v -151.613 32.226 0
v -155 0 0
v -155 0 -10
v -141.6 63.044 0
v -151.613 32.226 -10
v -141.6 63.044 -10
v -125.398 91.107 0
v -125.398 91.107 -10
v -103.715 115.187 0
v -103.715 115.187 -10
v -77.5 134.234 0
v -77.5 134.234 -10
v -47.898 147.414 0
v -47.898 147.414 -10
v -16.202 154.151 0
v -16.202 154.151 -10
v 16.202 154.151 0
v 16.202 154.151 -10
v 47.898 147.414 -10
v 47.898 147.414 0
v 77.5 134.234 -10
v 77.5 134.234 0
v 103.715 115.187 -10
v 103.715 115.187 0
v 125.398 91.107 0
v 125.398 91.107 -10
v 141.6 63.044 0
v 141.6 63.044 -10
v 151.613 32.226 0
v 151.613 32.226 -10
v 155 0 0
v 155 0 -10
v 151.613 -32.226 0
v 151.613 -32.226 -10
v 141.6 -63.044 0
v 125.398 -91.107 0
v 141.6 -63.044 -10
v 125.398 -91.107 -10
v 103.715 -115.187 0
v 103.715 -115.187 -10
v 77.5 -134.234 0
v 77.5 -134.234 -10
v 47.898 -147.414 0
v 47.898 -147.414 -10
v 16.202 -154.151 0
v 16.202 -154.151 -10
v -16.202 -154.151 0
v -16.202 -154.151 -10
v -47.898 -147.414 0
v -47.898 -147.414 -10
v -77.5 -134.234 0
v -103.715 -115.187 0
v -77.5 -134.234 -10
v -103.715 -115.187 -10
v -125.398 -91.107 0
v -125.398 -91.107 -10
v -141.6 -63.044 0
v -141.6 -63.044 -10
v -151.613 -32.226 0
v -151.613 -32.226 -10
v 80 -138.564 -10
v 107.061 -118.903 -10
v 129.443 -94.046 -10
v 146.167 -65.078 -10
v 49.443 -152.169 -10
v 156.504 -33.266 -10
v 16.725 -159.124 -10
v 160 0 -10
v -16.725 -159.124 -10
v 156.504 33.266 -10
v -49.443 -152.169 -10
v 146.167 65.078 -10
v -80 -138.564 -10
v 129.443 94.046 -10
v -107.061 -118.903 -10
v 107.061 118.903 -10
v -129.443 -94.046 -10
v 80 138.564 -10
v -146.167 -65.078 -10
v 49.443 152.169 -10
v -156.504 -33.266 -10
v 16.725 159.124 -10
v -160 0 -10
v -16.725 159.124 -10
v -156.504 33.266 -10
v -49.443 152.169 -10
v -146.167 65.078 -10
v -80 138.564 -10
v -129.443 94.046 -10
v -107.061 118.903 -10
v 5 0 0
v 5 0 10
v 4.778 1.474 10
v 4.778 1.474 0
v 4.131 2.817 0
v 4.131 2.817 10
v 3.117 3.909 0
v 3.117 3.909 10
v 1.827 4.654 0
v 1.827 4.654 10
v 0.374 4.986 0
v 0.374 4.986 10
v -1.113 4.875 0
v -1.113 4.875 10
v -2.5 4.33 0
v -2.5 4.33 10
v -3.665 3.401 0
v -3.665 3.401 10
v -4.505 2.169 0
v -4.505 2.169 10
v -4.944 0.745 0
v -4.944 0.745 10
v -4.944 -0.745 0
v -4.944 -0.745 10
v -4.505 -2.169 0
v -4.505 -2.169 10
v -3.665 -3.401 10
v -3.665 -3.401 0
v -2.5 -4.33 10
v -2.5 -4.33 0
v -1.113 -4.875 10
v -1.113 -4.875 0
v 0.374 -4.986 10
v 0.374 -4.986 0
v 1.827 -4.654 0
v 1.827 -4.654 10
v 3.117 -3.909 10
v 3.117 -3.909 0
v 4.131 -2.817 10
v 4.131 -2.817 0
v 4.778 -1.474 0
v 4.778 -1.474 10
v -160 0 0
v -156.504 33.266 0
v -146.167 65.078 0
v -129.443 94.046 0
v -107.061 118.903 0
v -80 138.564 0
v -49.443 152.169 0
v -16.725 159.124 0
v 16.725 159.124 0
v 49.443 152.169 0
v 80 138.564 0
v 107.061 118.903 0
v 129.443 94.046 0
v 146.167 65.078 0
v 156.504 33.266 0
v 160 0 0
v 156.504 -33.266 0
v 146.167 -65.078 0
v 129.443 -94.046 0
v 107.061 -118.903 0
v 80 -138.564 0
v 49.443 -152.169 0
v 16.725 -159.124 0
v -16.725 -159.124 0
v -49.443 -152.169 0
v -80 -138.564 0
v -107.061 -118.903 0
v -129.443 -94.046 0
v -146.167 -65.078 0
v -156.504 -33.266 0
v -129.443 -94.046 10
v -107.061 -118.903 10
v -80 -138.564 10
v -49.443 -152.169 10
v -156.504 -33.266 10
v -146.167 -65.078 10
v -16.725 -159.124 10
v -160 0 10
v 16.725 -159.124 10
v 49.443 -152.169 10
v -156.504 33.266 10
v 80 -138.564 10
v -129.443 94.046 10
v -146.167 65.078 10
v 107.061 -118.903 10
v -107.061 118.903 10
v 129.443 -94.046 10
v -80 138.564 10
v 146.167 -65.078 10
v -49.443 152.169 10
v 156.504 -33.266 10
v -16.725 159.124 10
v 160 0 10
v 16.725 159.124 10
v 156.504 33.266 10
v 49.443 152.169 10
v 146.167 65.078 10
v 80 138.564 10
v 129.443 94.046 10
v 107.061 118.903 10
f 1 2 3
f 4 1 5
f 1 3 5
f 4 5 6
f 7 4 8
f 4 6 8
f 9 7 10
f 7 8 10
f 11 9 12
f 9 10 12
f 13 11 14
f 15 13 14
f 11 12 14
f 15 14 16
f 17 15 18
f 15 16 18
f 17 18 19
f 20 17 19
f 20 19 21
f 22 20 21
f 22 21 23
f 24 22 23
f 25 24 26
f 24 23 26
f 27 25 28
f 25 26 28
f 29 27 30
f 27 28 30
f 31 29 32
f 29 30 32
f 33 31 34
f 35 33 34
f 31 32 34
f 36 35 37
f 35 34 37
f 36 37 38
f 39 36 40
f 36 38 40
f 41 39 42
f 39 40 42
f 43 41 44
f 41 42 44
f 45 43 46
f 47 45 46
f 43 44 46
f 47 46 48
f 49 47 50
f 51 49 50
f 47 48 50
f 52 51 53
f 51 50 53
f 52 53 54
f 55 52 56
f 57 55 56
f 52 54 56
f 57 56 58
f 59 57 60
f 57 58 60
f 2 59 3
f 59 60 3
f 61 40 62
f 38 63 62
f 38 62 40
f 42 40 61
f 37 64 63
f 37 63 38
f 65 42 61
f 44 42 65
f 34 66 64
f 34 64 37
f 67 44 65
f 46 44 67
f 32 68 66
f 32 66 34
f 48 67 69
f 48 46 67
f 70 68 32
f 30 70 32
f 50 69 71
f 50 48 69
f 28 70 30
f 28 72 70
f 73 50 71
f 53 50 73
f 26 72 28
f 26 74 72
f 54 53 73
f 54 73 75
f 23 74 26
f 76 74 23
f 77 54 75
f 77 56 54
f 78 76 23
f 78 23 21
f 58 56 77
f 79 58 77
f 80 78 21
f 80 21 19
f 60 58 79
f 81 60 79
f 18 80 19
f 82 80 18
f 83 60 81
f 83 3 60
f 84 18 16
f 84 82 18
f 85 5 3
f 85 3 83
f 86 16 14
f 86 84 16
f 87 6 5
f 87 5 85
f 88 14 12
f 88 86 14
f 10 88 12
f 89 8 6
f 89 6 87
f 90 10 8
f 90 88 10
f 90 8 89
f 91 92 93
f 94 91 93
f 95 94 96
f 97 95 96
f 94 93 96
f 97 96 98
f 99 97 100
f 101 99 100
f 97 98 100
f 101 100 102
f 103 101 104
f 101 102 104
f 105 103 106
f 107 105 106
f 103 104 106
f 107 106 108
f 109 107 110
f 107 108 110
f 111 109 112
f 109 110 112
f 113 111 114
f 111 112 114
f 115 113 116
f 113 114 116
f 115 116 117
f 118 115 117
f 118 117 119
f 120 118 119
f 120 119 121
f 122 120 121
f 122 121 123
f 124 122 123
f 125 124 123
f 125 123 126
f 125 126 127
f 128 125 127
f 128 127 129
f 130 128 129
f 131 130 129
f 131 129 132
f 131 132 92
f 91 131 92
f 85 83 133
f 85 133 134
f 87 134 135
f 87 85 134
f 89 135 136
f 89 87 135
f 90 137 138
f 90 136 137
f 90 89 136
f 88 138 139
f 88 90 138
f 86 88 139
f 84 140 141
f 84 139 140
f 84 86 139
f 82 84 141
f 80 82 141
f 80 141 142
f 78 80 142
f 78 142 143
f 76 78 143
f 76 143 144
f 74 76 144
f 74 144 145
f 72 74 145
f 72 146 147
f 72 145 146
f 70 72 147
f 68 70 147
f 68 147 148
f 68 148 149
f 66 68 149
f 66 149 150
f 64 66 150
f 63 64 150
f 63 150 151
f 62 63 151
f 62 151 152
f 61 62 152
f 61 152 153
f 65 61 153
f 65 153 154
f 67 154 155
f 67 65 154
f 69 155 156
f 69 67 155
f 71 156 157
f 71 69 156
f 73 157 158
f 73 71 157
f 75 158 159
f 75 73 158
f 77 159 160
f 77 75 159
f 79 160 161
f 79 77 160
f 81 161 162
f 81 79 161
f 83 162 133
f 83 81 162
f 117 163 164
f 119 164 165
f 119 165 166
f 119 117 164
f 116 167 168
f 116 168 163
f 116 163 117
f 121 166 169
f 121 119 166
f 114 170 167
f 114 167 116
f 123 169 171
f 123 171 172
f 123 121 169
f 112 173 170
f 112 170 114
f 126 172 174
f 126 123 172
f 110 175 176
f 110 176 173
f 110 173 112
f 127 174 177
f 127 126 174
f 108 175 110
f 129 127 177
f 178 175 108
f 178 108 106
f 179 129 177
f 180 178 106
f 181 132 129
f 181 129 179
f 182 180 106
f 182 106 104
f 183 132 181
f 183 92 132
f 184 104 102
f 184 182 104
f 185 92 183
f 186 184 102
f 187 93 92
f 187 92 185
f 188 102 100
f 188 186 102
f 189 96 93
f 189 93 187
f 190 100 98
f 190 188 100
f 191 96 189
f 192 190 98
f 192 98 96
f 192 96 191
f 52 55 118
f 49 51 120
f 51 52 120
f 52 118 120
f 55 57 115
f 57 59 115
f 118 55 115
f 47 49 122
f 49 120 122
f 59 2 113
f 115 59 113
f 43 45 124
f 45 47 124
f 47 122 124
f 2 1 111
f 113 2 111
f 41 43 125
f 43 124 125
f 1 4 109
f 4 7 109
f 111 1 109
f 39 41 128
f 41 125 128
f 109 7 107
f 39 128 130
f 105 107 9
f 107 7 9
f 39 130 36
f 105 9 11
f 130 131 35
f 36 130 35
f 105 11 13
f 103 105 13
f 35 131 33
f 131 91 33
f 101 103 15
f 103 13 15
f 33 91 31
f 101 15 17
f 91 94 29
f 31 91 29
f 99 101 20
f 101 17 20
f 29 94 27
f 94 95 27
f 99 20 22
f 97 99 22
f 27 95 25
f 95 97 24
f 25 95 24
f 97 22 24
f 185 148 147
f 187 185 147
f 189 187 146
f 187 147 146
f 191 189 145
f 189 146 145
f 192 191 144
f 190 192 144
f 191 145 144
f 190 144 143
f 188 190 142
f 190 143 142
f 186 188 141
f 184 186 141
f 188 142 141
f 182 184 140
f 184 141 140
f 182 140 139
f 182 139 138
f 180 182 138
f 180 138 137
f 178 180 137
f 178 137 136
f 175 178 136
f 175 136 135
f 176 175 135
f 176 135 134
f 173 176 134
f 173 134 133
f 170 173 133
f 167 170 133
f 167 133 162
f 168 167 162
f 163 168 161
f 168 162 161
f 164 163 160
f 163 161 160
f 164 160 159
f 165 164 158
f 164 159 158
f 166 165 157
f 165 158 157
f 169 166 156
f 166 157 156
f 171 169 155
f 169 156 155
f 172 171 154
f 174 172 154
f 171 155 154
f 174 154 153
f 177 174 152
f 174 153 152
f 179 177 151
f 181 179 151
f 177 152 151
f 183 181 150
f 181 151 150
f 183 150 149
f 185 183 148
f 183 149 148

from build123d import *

# Parameters (mm, degrees)
SKETCH_1_R          = 160
EXTRUDE_1_DEPTH     = 10
EXTRUDE_START       = 10
SKETCH_3_R          = 160
SKETCH_3_R_2        = 155
EXTRUDE_1_2_DEPTH   = 10
SKETCH_4_R          = 5
CUT_EXTRUDE_1_DEPTH = 228.156333832


with BuildPart() as part:
    # 草图1 → Extrude 1 (new body)
    with BuildSketch(Plane.XY):
        Circle(SKETCH_1_R)
    extrude(amount=EXTRUDE_1_DEPTH)

    # 草图3 → Extrude 1 2 (add)
    with BuildSketch(Plane(origin=(0, 0, 0), x_dir=(-1, 0, 0), z_dir=(0, 0, -1)).offset(EXTRUDE_START)):
        Circle(SKETCH_3_R)
        Circle(SKETCH_3_R_2, mode=Mode.SUBTRACT)
    extrude(amount=-EXTRUDE_1_2_DEPTH)

    # 草图4 → 切除-拉伸1 (cut, through all)
    with BuildSketch(Plane.XY.offset(10)):
        Circle(SKETCH_4_R)
    extrude(amount=-CUT_EXTRUDE_1_DEPTH, mode=Mode.SUBTRACT)


solid = part.part
